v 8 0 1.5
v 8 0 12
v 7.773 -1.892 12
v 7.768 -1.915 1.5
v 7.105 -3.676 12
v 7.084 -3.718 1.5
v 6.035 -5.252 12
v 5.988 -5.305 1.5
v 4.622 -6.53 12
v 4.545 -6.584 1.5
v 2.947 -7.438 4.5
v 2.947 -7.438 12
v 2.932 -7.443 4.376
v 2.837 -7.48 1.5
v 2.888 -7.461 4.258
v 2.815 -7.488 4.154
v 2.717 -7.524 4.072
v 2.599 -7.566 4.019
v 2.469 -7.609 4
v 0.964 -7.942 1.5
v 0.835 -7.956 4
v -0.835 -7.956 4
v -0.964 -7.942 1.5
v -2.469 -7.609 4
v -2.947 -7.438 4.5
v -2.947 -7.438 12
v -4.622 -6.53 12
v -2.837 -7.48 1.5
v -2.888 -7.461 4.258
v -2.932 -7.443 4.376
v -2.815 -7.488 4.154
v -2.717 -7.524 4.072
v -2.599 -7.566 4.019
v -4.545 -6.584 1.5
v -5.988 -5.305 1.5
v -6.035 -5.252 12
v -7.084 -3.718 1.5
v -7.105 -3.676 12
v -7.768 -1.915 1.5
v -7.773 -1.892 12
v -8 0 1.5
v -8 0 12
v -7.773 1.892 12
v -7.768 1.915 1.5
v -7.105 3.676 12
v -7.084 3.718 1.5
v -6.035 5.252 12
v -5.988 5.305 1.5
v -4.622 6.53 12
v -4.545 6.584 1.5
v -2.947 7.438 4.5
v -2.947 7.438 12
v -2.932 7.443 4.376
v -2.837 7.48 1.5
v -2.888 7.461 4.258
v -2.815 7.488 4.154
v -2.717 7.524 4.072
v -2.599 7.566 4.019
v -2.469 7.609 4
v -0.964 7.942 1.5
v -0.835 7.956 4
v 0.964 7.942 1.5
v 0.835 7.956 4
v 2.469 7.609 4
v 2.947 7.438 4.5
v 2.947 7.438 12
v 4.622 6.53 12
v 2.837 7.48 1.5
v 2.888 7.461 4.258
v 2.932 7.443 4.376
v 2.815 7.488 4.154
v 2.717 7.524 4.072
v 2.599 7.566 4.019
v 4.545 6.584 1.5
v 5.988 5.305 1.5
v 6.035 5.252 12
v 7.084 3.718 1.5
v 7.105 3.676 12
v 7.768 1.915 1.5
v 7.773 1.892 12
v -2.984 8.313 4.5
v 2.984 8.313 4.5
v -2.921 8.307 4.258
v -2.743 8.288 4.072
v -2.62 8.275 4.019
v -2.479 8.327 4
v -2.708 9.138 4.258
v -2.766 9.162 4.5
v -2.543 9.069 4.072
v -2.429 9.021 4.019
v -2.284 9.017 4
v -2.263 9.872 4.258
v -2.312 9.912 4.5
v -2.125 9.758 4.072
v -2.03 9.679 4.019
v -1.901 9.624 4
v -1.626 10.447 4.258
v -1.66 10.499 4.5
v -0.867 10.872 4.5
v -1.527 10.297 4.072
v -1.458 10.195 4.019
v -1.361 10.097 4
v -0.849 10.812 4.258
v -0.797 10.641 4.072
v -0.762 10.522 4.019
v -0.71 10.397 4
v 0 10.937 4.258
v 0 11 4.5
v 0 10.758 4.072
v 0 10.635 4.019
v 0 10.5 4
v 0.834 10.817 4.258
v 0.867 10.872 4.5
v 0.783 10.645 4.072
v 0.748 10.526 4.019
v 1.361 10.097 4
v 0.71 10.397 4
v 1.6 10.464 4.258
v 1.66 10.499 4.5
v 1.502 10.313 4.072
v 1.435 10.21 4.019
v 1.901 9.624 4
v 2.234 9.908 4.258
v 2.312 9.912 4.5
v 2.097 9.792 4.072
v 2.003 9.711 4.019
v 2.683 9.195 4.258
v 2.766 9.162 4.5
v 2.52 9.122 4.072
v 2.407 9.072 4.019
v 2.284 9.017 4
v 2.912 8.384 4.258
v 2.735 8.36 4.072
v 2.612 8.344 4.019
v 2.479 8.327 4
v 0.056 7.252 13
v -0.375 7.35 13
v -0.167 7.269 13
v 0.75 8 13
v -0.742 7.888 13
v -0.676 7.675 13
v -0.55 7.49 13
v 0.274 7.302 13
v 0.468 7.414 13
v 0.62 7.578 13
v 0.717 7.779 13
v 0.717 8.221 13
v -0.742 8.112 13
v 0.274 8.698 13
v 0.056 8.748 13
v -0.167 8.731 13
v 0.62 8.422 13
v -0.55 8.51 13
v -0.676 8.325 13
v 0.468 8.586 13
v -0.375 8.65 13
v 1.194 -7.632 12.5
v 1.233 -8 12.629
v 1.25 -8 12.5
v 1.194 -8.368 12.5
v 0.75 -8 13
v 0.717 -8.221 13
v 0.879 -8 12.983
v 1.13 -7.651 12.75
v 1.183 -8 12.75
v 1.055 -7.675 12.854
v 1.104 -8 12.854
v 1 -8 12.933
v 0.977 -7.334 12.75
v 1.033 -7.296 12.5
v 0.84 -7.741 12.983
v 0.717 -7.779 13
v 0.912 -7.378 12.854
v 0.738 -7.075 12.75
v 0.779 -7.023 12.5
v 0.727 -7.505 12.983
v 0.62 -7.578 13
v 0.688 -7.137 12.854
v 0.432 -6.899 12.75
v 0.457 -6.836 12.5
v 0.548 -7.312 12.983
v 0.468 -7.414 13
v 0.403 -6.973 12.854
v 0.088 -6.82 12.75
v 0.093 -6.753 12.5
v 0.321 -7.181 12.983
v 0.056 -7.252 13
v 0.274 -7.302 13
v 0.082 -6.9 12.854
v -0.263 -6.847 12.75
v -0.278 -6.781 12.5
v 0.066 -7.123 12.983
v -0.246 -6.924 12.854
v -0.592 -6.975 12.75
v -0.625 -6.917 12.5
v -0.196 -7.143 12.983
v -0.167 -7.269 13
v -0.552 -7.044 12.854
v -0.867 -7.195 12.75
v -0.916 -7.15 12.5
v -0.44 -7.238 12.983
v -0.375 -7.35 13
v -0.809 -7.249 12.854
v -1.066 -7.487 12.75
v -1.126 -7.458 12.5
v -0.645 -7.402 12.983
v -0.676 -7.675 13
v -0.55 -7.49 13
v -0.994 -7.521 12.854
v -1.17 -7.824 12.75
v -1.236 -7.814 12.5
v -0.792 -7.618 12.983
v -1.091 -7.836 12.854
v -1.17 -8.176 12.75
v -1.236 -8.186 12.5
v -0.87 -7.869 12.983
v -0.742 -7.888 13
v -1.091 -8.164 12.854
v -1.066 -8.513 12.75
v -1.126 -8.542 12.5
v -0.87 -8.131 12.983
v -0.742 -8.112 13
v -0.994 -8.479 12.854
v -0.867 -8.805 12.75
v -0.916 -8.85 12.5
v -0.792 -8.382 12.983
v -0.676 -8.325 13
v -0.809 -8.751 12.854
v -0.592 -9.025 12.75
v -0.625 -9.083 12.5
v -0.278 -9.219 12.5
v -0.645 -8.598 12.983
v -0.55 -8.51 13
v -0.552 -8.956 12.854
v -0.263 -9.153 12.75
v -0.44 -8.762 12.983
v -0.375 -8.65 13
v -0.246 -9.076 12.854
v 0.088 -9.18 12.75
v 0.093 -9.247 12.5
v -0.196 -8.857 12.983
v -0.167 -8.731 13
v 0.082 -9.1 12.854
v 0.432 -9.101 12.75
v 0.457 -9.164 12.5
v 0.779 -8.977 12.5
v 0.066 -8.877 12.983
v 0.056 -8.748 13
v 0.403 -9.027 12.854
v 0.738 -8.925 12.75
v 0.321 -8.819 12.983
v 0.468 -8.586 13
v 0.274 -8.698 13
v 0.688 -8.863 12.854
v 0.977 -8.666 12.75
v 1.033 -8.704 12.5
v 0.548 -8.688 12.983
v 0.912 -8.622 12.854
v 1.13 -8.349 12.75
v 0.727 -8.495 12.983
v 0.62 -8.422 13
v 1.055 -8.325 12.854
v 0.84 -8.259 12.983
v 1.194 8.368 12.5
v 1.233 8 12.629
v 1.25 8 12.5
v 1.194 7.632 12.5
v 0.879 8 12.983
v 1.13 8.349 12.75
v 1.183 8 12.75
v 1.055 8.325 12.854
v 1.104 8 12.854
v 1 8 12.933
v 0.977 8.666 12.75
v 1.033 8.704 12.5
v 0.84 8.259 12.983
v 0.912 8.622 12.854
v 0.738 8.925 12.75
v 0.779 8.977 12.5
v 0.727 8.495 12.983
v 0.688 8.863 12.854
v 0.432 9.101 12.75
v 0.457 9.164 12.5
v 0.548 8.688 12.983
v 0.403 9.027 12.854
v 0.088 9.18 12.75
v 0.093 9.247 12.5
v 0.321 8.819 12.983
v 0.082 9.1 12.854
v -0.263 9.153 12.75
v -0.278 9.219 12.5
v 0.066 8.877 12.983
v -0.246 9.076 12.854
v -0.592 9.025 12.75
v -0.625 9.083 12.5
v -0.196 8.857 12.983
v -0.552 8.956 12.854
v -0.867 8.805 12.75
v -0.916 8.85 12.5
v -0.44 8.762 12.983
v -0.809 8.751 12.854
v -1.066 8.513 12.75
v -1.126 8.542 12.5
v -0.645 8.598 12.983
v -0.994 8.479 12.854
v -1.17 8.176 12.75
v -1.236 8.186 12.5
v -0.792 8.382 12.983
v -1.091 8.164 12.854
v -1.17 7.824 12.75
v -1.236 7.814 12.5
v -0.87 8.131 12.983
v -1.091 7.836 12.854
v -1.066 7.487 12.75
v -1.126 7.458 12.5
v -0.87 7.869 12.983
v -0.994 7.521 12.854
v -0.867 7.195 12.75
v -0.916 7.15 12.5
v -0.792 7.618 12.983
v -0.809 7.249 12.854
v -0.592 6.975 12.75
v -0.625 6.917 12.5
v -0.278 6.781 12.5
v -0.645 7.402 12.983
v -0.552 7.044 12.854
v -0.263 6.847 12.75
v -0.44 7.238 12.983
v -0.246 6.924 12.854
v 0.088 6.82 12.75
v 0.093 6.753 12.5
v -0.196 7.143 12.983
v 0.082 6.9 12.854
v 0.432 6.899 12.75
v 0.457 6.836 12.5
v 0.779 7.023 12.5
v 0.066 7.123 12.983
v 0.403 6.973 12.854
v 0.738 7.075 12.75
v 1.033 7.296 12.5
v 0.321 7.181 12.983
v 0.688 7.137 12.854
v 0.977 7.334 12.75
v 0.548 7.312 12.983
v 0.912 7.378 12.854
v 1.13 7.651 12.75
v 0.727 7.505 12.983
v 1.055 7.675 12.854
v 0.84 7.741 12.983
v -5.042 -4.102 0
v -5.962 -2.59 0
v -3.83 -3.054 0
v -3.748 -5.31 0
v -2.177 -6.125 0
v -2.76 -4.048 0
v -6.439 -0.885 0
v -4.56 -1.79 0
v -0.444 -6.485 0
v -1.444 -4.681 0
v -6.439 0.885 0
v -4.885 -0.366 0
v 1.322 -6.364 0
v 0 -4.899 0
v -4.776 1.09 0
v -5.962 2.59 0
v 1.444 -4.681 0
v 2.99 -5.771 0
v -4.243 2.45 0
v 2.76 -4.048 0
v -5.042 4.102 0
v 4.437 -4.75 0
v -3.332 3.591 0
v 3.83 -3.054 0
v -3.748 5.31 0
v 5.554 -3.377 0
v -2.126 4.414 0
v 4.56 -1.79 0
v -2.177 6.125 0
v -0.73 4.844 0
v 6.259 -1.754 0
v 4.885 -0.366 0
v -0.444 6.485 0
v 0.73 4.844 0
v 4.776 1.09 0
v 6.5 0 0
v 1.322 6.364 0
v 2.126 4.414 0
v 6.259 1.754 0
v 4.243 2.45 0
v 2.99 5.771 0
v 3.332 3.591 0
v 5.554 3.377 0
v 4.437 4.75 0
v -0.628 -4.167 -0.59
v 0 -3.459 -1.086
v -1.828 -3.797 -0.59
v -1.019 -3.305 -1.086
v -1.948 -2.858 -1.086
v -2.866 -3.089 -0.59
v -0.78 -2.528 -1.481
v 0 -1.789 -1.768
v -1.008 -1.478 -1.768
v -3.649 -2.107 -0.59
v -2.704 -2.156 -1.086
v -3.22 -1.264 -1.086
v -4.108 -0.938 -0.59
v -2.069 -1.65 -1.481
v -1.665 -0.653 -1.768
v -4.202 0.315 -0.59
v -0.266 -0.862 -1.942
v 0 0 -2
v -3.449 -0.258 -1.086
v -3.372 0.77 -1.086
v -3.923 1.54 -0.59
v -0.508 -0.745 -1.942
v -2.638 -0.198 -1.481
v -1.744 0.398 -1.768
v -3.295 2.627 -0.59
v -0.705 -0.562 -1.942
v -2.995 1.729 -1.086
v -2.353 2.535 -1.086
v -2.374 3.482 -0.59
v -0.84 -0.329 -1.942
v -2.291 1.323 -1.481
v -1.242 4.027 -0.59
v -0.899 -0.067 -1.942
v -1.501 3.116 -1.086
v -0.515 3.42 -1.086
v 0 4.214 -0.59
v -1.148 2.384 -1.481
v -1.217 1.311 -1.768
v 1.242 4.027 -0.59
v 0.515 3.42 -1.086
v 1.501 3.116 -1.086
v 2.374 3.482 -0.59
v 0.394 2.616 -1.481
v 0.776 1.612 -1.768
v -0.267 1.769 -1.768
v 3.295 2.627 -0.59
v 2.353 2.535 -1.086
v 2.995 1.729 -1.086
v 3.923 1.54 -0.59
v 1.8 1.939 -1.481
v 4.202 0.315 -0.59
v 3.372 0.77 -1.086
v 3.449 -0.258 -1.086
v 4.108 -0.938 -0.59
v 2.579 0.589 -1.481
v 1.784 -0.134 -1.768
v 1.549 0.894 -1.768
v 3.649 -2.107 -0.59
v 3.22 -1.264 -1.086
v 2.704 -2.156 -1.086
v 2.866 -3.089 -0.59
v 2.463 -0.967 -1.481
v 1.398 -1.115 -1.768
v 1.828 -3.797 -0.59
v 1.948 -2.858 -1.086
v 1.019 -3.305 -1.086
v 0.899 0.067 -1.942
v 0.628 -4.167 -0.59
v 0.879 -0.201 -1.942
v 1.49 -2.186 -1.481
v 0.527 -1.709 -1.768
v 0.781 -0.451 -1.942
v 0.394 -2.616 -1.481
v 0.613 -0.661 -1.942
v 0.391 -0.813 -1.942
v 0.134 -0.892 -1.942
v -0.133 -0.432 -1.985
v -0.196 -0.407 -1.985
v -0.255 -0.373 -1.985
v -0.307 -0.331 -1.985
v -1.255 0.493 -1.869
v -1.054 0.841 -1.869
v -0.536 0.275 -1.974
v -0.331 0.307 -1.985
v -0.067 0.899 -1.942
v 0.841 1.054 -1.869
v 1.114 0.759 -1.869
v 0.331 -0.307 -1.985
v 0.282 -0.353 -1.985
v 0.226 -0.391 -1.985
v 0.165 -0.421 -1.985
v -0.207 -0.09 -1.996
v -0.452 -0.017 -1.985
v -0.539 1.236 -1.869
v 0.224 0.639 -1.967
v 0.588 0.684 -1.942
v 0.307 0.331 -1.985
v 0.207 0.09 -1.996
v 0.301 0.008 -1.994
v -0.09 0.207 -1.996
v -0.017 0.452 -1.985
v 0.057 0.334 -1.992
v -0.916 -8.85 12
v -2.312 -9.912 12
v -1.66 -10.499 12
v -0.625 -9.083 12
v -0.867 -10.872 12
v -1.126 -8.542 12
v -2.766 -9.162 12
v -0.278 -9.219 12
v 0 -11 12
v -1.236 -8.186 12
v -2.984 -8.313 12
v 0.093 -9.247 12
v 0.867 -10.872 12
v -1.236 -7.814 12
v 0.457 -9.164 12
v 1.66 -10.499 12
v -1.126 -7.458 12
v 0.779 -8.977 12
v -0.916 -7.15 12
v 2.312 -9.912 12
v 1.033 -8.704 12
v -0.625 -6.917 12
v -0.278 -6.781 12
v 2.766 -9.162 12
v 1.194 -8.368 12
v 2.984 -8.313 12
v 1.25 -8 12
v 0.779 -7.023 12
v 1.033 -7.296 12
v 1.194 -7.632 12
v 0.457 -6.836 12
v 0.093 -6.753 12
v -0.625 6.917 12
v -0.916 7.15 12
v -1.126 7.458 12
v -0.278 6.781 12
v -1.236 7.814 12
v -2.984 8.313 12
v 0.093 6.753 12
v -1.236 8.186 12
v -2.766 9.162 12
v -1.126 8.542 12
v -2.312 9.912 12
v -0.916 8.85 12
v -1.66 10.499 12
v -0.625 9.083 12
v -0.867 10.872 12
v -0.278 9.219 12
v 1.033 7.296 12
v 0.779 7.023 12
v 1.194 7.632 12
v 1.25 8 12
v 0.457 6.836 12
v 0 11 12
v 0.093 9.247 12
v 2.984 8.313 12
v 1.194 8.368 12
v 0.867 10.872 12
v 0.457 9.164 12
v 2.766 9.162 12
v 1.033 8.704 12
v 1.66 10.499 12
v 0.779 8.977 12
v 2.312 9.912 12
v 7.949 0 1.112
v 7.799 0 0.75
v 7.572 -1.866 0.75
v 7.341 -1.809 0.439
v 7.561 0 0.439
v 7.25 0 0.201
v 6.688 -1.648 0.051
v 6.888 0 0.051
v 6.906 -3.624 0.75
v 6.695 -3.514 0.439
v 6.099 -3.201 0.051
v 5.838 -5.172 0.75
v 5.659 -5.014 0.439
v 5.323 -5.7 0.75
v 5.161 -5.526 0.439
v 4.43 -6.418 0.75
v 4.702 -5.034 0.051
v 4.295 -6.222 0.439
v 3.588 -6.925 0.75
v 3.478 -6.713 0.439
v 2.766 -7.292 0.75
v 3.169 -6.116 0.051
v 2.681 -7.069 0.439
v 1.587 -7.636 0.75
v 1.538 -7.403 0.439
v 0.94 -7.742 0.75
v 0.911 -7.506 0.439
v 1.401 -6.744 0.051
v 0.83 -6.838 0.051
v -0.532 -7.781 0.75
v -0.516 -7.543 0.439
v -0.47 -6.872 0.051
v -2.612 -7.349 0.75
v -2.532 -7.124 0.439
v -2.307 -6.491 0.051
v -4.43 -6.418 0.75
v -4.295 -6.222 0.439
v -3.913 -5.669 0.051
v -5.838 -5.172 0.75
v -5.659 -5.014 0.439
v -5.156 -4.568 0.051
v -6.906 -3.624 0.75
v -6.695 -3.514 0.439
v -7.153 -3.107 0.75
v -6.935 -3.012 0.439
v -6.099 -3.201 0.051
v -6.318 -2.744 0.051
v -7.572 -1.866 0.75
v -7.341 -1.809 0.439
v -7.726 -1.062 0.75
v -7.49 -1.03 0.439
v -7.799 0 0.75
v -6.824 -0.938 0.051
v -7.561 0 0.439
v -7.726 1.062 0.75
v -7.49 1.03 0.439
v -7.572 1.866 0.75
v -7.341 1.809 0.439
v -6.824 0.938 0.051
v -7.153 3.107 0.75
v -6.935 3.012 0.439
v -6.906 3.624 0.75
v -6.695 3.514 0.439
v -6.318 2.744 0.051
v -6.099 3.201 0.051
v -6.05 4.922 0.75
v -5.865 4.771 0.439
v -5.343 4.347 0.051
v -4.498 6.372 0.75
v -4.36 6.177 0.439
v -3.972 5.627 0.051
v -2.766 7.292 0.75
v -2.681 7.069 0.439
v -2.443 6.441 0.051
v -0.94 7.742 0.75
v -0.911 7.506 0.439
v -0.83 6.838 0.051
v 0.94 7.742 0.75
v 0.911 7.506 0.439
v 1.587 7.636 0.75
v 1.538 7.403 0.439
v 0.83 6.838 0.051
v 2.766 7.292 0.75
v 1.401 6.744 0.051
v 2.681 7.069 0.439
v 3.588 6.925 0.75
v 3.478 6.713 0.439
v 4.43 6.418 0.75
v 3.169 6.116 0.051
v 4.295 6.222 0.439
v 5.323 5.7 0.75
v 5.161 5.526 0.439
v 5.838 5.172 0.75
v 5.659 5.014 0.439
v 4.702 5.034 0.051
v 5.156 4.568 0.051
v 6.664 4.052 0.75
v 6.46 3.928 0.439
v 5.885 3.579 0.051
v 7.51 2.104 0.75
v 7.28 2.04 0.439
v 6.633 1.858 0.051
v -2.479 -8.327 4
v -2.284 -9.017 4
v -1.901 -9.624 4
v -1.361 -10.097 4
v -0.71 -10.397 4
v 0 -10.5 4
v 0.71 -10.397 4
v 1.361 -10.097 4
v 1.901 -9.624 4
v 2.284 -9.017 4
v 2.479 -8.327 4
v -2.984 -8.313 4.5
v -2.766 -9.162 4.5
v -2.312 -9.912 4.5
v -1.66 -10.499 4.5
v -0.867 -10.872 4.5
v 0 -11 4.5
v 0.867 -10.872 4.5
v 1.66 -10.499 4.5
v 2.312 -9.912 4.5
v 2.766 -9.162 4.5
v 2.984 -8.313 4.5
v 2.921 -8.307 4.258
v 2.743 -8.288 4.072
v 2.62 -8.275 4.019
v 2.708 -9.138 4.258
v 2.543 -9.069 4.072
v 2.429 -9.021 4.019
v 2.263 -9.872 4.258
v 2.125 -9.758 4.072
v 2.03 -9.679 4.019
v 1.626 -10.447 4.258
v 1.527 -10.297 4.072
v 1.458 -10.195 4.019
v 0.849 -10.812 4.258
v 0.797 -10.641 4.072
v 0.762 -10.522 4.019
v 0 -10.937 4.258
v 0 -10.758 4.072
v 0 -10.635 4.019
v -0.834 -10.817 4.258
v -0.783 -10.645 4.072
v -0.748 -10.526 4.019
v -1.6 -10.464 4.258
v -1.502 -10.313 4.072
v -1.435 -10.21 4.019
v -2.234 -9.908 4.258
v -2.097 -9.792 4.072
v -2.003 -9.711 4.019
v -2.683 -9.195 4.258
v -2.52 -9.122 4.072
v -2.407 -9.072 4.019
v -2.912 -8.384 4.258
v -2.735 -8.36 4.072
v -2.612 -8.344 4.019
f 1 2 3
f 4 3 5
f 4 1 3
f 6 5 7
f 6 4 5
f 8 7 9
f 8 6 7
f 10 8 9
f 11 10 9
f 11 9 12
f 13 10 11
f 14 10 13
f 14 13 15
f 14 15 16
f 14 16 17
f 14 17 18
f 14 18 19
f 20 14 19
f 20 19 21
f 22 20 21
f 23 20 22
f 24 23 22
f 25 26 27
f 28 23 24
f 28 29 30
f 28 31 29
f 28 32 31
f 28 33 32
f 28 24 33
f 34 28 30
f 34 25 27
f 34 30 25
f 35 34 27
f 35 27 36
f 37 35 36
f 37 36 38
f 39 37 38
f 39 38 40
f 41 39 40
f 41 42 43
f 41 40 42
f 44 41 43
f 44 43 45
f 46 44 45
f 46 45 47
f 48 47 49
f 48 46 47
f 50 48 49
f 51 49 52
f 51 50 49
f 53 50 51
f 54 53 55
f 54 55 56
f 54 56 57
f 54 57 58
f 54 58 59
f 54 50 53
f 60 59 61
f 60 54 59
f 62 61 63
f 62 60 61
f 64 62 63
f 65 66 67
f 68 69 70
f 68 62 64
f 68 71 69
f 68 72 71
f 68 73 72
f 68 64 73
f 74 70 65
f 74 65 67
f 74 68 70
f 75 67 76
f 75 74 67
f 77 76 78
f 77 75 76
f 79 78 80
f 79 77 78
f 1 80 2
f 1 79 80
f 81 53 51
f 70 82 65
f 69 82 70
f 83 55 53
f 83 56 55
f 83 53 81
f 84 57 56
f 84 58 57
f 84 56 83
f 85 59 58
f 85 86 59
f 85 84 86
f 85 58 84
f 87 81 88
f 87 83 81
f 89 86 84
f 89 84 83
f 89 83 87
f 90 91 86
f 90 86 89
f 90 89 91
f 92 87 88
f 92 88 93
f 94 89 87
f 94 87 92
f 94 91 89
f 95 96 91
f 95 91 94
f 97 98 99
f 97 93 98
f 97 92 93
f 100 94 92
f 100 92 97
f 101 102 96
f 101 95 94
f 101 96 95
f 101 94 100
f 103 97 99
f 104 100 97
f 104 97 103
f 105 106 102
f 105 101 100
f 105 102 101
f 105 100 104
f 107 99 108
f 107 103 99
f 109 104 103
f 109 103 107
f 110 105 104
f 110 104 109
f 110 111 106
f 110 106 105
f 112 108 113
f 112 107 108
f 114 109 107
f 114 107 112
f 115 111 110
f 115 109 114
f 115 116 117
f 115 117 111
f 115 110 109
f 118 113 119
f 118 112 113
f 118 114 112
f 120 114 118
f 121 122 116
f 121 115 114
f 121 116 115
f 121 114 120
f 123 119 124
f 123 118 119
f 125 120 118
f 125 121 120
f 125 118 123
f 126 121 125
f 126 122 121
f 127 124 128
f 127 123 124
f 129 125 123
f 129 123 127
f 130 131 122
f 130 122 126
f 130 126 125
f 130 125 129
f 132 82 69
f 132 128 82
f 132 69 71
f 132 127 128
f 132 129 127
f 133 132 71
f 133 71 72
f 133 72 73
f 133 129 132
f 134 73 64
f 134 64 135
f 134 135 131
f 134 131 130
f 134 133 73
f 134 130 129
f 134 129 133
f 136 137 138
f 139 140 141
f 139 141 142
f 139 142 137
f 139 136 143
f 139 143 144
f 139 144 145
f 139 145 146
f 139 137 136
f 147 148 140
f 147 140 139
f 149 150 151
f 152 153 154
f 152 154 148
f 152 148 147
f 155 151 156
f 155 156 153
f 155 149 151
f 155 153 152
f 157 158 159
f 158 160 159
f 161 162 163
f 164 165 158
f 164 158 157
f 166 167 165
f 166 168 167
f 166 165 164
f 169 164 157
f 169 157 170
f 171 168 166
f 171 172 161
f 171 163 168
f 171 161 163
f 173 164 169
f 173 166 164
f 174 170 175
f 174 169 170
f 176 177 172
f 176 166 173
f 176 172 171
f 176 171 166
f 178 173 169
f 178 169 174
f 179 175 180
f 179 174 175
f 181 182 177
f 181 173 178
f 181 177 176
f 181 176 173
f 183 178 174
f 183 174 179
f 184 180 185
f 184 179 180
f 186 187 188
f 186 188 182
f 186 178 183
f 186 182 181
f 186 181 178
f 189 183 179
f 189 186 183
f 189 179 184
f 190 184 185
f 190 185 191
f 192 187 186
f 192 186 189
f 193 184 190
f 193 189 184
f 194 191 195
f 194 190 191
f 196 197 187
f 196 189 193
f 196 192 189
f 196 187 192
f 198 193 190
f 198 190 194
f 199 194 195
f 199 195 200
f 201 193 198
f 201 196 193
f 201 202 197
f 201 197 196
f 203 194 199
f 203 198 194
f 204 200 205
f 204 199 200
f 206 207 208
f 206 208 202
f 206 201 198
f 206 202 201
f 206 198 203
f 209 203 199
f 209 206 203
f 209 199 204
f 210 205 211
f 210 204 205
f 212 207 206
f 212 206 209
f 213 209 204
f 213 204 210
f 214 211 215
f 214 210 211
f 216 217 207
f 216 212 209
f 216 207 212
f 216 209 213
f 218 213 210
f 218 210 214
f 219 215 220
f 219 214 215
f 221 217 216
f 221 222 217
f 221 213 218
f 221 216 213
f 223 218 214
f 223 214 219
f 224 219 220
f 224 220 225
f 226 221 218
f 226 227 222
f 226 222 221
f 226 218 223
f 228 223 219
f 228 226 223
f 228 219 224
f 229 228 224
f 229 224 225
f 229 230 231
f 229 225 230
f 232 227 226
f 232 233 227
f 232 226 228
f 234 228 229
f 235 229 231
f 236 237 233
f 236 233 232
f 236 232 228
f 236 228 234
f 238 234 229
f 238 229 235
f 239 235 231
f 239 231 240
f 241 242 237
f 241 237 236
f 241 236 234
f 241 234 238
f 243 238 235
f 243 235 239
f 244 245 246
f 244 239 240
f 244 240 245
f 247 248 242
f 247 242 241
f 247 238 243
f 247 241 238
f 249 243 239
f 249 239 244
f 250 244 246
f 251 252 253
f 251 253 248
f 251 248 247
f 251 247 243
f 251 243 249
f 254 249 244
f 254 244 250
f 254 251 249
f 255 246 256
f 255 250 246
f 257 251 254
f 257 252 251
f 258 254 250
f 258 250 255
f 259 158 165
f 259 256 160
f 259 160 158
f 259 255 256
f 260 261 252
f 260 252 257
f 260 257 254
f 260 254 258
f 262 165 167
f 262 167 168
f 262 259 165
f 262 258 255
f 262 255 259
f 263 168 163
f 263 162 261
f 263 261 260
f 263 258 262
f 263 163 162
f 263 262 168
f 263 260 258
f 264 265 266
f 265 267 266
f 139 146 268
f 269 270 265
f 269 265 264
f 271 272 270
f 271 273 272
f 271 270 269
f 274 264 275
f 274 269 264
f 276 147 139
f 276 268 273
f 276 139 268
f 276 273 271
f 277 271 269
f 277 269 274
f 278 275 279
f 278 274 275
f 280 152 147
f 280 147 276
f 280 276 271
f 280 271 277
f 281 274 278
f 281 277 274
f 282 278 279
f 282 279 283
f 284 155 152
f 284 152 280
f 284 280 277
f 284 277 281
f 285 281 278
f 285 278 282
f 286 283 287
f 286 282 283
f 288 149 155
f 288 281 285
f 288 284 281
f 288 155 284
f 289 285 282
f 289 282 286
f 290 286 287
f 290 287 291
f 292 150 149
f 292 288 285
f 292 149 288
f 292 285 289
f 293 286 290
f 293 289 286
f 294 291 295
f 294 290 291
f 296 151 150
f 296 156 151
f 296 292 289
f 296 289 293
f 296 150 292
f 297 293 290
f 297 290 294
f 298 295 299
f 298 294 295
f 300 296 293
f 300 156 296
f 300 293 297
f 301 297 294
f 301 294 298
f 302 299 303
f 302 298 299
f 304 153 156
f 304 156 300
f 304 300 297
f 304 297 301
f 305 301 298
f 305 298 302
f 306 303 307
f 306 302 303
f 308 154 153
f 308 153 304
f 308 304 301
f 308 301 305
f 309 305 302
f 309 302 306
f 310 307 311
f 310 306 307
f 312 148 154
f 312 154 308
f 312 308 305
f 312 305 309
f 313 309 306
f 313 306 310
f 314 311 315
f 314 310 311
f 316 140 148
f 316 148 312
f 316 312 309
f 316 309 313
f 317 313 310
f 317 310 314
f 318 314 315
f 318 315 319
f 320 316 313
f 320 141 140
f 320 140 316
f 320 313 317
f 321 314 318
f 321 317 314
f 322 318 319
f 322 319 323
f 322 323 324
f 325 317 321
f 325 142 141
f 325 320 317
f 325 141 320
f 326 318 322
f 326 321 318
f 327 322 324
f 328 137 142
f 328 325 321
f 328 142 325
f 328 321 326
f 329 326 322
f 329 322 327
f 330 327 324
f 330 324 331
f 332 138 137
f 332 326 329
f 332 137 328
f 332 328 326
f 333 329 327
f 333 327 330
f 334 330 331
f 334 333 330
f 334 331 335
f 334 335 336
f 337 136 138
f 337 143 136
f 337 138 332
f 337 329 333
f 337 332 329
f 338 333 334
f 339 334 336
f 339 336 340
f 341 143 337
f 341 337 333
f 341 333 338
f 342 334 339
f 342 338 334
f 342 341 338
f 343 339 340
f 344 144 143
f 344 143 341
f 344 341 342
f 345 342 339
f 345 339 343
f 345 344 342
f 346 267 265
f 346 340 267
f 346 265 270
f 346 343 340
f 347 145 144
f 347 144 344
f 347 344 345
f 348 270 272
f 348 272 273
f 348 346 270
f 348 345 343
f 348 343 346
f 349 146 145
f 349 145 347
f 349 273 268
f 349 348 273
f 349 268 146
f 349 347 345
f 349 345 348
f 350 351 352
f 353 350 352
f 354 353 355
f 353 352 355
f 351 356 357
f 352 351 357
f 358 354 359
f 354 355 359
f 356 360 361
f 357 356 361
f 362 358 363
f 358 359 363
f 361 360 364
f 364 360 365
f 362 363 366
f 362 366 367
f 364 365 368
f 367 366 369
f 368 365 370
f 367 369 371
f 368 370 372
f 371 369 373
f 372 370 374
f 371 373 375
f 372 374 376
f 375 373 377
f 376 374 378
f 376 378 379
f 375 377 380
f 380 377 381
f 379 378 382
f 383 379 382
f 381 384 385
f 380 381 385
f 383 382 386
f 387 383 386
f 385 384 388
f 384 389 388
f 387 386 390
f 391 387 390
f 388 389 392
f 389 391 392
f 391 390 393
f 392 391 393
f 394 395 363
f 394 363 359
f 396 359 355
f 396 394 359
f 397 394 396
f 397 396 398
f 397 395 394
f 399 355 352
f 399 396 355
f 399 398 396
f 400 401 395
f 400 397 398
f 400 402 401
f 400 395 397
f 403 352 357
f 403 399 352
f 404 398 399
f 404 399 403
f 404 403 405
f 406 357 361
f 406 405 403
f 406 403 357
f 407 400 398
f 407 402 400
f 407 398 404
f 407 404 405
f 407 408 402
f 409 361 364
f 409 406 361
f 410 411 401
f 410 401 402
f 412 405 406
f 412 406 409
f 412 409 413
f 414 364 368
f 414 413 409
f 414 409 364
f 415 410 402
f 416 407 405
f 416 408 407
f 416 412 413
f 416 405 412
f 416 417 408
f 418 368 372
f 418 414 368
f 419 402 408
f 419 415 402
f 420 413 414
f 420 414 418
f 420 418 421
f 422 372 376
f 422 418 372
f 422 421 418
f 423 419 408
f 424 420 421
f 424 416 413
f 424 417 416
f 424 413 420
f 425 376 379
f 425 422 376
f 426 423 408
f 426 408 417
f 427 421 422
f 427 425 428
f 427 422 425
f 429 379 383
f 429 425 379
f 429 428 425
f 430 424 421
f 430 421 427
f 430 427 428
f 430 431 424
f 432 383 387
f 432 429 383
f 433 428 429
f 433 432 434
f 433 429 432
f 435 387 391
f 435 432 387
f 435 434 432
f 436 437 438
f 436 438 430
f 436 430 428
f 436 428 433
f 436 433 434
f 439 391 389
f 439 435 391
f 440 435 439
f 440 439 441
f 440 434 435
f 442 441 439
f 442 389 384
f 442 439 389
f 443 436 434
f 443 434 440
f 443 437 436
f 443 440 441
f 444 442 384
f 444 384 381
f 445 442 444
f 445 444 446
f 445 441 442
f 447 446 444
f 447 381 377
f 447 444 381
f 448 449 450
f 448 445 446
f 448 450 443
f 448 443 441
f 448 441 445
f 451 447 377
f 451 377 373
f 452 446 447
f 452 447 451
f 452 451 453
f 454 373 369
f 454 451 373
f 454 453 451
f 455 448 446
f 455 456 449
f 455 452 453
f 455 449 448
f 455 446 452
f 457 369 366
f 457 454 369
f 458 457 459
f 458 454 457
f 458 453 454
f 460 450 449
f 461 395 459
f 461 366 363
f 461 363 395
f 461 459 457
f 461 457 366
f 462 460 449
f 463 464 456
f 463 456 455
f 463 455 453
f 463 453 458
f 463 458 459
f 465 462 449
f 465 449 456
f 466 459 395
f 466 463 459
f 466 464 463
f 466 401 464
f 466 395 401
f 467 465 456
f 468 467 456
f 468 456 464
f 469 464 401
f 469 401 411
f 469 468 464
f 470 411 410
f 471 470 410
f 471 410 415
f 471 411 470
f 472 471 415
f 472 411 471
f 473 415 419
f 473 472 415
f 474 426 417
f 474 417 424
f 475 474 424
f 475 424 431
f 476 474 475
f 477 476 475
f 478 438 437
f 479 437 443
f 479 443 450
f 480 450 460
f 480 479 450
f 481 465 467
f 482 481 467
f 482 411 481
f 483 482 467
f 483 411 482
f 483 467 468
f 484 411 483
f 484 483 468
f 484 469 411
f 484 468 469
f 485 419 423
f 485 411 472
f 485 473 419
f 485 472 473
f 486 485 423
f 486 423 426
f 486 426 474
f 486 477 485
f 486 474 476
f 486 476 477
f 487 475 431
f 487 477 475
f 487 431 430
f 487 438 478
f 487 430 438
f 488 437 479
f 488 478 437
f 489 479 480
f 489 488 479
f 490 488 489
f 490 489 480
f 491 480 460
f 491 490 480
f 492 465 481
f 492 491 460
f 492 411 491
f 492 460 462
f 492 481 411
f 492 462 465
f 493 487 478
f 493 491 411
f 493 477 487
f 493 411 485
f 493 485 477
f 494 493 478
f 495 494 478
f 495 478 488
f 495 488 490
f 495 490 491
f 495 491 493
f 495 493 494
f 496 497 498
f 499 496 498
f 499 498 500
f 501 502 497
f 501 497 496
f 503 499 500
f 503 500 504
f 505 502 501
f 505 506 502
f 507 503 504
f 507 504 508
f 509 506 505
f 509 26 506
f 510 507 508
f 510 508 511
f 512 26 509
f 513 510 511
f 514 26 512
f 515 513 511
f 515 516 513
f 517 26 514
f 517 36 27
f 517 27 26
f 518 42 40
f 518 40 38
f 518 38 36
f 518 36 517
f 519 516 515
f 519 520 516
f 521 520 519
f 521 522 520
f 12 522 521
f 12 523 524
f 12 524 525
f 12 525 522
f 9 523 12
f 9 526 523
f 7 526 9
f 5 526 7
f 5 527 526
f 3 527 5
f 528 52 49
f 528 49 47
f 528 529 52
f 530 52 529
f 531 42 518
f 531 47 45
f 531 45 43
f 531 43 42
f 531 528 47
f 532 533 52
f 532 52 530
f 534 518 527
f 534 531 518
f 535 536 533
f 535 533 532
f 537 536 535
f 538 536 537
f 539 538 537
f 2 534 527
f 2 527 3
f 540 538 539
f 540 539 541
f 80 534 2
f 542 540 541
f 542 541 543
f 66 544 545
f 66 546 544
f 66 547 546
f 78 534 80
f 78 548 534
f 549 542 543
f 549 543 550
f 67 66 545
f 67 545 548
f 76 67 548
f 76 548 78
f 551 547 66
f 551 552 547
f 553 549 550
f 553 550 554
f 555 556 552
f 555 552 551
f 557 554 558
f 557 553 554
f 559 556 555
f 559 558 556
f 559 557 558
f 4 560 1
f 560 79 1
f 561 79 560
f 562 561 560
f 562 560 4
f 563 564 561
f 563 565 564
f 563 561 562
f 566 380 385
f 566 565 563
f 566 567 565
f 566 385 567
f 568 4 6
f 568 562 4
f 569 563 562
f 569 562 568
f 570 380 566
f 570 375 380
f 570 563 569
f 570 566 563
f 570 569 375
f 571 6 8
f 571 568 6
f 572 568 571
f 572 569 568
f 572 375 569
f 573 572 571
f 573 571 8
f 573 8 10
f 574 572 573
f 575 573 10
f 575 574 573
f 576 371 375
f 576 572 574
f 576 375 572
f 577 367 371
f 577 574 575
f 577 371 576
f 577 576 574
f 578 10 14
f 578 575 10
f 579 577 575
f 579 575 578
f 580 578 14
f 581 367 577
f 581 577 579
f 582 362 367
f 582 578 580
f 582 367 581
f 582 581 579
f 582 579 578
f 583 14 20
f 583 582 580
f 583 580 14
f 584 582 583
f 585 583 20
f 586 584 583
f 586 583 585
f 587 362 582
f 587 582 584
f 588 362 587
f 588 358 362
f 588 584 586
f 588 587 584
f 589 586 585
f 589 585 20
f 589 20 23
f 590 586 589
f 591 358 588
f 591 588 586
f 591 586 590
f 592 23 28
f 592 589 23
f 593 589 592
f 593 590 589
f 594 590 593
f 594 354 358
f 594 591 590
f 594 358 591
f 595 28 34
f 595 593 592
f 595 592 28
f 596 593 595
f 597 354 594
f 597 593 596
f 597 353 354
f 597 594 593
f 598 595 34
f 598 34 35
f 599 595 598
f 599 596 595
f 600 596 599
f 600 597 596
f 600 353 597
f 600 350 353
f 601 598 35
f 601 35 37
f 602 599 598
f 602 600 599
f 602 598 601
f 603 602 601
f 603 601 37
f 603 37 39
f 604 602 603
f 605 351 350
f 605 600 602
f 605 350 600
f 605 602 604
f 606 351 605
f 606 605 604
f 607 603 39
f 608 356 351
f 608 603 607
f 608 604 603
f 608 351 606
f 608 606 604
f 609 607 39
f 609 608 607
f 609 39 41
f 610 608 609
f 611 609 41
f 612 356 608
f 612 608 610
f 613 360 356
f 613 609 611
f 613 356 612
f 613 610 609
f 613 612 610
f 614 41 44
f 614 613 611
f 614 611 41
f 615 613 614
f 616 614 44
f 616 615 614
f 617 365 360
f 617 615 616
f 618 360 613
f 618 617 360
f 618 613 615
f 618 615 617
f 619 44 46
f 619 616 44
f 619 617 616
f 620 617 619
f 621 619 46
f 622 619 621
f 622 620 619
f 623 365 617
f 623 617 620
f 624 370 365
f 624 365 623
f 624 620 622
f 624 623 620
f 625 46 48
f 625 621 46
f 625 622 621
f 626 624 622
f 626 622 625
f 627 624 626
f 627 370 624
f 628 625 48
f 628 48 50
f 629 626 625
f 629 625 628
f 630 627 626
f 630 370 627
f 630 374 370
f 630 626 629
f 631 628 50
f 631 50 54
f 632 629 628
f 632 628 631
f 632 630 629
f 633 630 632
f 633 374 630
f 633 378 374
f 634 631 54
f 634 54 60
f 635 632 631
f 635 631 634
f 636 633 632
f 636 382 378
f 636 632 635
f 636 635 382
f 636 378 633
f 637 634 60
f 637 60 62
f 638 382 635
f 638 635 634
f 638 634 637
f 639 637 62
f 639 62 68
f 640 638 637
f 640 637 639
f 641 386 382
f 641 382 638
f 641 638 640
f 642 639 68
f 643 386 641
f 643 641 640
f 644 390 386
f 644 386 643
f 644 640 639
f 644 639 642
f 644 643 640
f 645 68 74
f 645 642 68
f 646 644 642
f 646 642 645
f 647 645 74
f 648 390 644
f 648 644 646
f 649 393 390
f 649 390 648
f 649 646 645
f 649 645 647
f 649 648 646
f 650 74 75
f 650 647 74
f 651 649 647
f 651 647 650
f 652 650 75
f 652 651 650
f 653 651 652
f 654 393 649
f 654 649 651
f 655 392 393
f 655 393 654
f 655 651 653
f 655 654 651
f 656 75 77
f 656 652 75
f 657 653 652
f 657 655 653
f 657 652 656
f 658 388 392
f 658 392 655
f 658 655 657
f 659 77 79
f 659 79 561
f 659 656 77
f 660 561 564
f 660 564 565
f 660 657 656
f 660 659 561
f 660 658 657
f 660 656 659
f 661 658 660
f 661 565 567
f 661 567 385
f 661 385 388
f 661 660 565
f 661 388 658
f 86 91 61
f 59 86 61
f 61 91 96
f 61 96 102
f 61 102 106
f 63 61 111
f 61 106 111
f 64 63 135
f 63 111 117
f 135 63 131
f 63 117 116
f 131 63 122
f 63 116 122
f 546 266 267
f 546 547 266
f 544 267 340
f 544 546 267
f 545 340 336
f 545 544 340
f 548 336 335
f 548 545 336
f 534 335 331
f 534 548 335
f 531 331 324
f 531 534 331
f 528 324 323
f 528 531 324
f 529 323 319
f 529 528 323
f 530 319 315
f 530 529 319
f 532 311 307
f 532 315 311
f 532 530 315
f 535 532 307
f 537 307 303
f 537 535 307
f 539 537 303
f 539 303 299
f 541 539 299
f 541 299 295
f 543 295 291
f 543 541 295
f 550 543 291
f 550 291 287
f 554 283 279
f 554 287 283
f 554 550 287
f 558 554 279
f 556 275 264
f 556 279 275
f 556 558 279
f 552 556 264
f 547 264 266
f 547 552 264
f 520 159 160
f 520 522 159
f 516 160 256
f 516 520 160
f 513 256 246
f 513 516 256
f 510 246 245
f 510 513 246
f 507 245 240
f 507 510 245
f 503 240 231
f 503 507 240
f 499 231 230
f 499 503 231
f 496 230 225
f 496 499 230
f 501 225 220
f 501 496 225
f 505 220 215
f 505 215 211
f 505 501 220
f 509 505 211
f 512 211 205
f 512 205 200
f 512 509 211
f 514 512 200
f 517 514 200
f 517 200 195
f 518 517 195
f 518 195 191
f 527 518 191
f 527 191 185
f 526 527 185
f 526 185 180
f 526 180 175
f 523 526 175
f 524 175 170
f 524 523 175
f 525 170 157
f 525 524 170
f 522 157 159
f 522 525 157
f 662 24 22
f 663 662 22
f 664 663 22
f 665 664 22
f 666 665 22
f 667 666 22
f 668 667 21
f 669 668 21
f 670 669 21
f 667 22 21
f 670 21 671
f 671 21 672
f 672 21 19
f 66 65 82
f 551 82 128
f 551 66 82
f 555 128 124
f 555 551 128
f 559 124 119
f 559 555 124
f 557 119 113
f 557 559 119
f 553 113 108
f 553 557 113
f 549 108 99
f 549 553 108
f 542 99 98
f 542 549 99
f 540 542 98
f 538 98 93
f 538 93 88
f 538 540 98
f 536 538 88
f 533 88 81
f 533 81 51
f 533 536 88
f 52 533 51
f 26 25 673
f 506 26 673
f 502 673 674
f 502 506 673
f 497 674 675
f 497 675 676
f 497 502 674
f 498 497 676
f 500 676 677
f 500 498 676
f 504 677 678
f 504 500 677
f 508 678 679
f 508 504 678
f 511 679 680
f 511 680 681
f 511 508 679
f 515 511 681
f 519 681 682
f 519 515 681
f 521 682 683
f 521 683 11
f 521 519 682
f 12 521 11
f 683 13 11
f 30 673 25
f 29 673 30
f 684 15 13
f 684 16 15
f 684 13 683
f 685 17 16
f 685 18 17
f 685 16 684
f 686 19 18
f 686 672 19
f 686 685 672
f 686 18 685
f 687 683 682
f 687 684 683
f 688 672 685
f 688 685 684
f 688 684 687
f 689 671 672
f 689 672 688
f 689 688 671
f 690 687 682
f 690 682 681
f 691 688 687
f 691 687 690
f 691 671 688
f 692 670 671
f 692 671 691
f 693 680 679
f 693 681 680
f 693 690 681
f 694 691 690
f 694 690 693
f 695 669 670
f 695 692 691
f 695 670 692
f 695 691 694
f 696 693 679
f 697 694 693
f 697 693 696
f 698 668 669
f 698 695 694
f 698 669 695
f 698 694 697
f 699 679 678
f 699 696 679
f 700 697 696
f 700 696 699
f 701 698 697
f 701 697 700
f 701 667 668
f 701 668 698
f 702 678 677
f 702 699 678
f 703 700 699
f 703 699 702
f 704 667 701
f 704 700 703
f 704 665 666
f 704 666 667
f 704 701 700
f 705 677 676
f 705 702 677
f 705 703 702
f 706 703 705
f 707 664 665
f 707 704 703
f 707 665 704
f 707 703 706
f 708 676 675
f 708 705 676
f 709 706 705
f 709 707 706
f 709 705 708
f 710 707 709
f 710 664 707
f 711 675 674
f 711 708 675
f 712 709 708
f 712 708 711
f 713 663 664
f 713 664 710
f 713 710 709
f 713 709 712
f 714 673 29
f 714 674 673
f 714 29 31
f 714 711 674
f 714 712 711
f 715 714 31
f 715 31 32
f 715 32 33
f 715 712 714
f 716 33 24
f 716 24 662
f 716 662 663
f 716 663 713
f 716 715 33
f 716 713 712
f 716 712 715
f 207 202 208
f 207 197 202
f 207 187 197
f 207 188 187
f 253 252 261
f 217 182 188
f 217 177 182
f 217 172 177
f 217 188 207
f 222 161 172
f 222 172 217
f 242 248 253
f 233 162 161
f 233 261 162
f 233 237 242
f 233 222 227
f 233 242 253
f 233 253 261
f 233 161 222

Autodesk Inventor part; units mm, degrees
ref_plane "YZ Plane" through (0, 0, 0) normal (1, 0, 0) x (0, 1, 0)
ref_plane "XZ Plane" through (0, 0, 0) normal (0, 1, 0) x (-1, 0, 0)
ref_plane "XY Plane" through (0, 0, 0) normal (0, 0, 1) x (1, 0, 0)
sketch "Sketch1" plane through (0, 0, 0) normal (0, 0, 1) x (1, 0, 0)
  circle A0 centre (0, 0) radius 8
  dimension "d0" = 16
extrude "Extrusion1" add sketch "Sketch1" along normal blind 12
sketch "Sketch2" plane through (0, 0, 12) normal (0, 0, 1) x (1, 0, 0)
  circle A0 centre (0, 0) radius 8 projected
  circle A1 centre (0, -8) radius 3
  circle A2 centre (0, 8) radius 3
  dimension "d3" = 6
  dimension "d4" = 6
extrude "Extrusion2" add sketch "Sketch2" against normal blind 8 contours A2 A0 | A0 A2 | A1 A0 | A0 A1
sketch "Sketch4" plane through (0, 0, 0) normal (1, 0, 0) x (0, 1, 0)
  line L0 (0, 0) -> (0, -2)
  arc A0 (-4.899, 0) -> (0, -2) centre (0, 5) ccw
  line L1 (0, 0) -> (-4.899, 0)
  point P0 (-7, 0)
  dimension "d10" = 2
revolve "Revolution1" add sketch "Sketch4" angle 360 about axis through (0, 0, 0) along (0, 0, -1)
fillet "Fillet2" radius 0.5 2 edges at (0, 11, 4) (0, -11, 4)
fillet "Fillet3" radius 1.5 1 edges at (-8, 0, 0)
sketch "Sketch6" plane through (0, 0, 12) normal (0, 0, 1) x (1, 0, 0)
  arc A0 (2.9468, 7.4375) -> (-2.9468, 7.4375) centre (0, 8) ccw projected
  circle A1 centre (0, 8) radius 1.25
  point P0 (0, 0)
  dimension "d16" = 2.5
extrude "Extrusion3" add sketch "Sketch6" along normal blind 1
fillet "Fillet4" radius 0.5 1 edges at (-1.25, 8, 13)
mirror "Mirror1" about plane through (0, 0, 0) normal (0, 1, 0) of "Extrusion3", "Fillet4"
properties part number "wheel3"
